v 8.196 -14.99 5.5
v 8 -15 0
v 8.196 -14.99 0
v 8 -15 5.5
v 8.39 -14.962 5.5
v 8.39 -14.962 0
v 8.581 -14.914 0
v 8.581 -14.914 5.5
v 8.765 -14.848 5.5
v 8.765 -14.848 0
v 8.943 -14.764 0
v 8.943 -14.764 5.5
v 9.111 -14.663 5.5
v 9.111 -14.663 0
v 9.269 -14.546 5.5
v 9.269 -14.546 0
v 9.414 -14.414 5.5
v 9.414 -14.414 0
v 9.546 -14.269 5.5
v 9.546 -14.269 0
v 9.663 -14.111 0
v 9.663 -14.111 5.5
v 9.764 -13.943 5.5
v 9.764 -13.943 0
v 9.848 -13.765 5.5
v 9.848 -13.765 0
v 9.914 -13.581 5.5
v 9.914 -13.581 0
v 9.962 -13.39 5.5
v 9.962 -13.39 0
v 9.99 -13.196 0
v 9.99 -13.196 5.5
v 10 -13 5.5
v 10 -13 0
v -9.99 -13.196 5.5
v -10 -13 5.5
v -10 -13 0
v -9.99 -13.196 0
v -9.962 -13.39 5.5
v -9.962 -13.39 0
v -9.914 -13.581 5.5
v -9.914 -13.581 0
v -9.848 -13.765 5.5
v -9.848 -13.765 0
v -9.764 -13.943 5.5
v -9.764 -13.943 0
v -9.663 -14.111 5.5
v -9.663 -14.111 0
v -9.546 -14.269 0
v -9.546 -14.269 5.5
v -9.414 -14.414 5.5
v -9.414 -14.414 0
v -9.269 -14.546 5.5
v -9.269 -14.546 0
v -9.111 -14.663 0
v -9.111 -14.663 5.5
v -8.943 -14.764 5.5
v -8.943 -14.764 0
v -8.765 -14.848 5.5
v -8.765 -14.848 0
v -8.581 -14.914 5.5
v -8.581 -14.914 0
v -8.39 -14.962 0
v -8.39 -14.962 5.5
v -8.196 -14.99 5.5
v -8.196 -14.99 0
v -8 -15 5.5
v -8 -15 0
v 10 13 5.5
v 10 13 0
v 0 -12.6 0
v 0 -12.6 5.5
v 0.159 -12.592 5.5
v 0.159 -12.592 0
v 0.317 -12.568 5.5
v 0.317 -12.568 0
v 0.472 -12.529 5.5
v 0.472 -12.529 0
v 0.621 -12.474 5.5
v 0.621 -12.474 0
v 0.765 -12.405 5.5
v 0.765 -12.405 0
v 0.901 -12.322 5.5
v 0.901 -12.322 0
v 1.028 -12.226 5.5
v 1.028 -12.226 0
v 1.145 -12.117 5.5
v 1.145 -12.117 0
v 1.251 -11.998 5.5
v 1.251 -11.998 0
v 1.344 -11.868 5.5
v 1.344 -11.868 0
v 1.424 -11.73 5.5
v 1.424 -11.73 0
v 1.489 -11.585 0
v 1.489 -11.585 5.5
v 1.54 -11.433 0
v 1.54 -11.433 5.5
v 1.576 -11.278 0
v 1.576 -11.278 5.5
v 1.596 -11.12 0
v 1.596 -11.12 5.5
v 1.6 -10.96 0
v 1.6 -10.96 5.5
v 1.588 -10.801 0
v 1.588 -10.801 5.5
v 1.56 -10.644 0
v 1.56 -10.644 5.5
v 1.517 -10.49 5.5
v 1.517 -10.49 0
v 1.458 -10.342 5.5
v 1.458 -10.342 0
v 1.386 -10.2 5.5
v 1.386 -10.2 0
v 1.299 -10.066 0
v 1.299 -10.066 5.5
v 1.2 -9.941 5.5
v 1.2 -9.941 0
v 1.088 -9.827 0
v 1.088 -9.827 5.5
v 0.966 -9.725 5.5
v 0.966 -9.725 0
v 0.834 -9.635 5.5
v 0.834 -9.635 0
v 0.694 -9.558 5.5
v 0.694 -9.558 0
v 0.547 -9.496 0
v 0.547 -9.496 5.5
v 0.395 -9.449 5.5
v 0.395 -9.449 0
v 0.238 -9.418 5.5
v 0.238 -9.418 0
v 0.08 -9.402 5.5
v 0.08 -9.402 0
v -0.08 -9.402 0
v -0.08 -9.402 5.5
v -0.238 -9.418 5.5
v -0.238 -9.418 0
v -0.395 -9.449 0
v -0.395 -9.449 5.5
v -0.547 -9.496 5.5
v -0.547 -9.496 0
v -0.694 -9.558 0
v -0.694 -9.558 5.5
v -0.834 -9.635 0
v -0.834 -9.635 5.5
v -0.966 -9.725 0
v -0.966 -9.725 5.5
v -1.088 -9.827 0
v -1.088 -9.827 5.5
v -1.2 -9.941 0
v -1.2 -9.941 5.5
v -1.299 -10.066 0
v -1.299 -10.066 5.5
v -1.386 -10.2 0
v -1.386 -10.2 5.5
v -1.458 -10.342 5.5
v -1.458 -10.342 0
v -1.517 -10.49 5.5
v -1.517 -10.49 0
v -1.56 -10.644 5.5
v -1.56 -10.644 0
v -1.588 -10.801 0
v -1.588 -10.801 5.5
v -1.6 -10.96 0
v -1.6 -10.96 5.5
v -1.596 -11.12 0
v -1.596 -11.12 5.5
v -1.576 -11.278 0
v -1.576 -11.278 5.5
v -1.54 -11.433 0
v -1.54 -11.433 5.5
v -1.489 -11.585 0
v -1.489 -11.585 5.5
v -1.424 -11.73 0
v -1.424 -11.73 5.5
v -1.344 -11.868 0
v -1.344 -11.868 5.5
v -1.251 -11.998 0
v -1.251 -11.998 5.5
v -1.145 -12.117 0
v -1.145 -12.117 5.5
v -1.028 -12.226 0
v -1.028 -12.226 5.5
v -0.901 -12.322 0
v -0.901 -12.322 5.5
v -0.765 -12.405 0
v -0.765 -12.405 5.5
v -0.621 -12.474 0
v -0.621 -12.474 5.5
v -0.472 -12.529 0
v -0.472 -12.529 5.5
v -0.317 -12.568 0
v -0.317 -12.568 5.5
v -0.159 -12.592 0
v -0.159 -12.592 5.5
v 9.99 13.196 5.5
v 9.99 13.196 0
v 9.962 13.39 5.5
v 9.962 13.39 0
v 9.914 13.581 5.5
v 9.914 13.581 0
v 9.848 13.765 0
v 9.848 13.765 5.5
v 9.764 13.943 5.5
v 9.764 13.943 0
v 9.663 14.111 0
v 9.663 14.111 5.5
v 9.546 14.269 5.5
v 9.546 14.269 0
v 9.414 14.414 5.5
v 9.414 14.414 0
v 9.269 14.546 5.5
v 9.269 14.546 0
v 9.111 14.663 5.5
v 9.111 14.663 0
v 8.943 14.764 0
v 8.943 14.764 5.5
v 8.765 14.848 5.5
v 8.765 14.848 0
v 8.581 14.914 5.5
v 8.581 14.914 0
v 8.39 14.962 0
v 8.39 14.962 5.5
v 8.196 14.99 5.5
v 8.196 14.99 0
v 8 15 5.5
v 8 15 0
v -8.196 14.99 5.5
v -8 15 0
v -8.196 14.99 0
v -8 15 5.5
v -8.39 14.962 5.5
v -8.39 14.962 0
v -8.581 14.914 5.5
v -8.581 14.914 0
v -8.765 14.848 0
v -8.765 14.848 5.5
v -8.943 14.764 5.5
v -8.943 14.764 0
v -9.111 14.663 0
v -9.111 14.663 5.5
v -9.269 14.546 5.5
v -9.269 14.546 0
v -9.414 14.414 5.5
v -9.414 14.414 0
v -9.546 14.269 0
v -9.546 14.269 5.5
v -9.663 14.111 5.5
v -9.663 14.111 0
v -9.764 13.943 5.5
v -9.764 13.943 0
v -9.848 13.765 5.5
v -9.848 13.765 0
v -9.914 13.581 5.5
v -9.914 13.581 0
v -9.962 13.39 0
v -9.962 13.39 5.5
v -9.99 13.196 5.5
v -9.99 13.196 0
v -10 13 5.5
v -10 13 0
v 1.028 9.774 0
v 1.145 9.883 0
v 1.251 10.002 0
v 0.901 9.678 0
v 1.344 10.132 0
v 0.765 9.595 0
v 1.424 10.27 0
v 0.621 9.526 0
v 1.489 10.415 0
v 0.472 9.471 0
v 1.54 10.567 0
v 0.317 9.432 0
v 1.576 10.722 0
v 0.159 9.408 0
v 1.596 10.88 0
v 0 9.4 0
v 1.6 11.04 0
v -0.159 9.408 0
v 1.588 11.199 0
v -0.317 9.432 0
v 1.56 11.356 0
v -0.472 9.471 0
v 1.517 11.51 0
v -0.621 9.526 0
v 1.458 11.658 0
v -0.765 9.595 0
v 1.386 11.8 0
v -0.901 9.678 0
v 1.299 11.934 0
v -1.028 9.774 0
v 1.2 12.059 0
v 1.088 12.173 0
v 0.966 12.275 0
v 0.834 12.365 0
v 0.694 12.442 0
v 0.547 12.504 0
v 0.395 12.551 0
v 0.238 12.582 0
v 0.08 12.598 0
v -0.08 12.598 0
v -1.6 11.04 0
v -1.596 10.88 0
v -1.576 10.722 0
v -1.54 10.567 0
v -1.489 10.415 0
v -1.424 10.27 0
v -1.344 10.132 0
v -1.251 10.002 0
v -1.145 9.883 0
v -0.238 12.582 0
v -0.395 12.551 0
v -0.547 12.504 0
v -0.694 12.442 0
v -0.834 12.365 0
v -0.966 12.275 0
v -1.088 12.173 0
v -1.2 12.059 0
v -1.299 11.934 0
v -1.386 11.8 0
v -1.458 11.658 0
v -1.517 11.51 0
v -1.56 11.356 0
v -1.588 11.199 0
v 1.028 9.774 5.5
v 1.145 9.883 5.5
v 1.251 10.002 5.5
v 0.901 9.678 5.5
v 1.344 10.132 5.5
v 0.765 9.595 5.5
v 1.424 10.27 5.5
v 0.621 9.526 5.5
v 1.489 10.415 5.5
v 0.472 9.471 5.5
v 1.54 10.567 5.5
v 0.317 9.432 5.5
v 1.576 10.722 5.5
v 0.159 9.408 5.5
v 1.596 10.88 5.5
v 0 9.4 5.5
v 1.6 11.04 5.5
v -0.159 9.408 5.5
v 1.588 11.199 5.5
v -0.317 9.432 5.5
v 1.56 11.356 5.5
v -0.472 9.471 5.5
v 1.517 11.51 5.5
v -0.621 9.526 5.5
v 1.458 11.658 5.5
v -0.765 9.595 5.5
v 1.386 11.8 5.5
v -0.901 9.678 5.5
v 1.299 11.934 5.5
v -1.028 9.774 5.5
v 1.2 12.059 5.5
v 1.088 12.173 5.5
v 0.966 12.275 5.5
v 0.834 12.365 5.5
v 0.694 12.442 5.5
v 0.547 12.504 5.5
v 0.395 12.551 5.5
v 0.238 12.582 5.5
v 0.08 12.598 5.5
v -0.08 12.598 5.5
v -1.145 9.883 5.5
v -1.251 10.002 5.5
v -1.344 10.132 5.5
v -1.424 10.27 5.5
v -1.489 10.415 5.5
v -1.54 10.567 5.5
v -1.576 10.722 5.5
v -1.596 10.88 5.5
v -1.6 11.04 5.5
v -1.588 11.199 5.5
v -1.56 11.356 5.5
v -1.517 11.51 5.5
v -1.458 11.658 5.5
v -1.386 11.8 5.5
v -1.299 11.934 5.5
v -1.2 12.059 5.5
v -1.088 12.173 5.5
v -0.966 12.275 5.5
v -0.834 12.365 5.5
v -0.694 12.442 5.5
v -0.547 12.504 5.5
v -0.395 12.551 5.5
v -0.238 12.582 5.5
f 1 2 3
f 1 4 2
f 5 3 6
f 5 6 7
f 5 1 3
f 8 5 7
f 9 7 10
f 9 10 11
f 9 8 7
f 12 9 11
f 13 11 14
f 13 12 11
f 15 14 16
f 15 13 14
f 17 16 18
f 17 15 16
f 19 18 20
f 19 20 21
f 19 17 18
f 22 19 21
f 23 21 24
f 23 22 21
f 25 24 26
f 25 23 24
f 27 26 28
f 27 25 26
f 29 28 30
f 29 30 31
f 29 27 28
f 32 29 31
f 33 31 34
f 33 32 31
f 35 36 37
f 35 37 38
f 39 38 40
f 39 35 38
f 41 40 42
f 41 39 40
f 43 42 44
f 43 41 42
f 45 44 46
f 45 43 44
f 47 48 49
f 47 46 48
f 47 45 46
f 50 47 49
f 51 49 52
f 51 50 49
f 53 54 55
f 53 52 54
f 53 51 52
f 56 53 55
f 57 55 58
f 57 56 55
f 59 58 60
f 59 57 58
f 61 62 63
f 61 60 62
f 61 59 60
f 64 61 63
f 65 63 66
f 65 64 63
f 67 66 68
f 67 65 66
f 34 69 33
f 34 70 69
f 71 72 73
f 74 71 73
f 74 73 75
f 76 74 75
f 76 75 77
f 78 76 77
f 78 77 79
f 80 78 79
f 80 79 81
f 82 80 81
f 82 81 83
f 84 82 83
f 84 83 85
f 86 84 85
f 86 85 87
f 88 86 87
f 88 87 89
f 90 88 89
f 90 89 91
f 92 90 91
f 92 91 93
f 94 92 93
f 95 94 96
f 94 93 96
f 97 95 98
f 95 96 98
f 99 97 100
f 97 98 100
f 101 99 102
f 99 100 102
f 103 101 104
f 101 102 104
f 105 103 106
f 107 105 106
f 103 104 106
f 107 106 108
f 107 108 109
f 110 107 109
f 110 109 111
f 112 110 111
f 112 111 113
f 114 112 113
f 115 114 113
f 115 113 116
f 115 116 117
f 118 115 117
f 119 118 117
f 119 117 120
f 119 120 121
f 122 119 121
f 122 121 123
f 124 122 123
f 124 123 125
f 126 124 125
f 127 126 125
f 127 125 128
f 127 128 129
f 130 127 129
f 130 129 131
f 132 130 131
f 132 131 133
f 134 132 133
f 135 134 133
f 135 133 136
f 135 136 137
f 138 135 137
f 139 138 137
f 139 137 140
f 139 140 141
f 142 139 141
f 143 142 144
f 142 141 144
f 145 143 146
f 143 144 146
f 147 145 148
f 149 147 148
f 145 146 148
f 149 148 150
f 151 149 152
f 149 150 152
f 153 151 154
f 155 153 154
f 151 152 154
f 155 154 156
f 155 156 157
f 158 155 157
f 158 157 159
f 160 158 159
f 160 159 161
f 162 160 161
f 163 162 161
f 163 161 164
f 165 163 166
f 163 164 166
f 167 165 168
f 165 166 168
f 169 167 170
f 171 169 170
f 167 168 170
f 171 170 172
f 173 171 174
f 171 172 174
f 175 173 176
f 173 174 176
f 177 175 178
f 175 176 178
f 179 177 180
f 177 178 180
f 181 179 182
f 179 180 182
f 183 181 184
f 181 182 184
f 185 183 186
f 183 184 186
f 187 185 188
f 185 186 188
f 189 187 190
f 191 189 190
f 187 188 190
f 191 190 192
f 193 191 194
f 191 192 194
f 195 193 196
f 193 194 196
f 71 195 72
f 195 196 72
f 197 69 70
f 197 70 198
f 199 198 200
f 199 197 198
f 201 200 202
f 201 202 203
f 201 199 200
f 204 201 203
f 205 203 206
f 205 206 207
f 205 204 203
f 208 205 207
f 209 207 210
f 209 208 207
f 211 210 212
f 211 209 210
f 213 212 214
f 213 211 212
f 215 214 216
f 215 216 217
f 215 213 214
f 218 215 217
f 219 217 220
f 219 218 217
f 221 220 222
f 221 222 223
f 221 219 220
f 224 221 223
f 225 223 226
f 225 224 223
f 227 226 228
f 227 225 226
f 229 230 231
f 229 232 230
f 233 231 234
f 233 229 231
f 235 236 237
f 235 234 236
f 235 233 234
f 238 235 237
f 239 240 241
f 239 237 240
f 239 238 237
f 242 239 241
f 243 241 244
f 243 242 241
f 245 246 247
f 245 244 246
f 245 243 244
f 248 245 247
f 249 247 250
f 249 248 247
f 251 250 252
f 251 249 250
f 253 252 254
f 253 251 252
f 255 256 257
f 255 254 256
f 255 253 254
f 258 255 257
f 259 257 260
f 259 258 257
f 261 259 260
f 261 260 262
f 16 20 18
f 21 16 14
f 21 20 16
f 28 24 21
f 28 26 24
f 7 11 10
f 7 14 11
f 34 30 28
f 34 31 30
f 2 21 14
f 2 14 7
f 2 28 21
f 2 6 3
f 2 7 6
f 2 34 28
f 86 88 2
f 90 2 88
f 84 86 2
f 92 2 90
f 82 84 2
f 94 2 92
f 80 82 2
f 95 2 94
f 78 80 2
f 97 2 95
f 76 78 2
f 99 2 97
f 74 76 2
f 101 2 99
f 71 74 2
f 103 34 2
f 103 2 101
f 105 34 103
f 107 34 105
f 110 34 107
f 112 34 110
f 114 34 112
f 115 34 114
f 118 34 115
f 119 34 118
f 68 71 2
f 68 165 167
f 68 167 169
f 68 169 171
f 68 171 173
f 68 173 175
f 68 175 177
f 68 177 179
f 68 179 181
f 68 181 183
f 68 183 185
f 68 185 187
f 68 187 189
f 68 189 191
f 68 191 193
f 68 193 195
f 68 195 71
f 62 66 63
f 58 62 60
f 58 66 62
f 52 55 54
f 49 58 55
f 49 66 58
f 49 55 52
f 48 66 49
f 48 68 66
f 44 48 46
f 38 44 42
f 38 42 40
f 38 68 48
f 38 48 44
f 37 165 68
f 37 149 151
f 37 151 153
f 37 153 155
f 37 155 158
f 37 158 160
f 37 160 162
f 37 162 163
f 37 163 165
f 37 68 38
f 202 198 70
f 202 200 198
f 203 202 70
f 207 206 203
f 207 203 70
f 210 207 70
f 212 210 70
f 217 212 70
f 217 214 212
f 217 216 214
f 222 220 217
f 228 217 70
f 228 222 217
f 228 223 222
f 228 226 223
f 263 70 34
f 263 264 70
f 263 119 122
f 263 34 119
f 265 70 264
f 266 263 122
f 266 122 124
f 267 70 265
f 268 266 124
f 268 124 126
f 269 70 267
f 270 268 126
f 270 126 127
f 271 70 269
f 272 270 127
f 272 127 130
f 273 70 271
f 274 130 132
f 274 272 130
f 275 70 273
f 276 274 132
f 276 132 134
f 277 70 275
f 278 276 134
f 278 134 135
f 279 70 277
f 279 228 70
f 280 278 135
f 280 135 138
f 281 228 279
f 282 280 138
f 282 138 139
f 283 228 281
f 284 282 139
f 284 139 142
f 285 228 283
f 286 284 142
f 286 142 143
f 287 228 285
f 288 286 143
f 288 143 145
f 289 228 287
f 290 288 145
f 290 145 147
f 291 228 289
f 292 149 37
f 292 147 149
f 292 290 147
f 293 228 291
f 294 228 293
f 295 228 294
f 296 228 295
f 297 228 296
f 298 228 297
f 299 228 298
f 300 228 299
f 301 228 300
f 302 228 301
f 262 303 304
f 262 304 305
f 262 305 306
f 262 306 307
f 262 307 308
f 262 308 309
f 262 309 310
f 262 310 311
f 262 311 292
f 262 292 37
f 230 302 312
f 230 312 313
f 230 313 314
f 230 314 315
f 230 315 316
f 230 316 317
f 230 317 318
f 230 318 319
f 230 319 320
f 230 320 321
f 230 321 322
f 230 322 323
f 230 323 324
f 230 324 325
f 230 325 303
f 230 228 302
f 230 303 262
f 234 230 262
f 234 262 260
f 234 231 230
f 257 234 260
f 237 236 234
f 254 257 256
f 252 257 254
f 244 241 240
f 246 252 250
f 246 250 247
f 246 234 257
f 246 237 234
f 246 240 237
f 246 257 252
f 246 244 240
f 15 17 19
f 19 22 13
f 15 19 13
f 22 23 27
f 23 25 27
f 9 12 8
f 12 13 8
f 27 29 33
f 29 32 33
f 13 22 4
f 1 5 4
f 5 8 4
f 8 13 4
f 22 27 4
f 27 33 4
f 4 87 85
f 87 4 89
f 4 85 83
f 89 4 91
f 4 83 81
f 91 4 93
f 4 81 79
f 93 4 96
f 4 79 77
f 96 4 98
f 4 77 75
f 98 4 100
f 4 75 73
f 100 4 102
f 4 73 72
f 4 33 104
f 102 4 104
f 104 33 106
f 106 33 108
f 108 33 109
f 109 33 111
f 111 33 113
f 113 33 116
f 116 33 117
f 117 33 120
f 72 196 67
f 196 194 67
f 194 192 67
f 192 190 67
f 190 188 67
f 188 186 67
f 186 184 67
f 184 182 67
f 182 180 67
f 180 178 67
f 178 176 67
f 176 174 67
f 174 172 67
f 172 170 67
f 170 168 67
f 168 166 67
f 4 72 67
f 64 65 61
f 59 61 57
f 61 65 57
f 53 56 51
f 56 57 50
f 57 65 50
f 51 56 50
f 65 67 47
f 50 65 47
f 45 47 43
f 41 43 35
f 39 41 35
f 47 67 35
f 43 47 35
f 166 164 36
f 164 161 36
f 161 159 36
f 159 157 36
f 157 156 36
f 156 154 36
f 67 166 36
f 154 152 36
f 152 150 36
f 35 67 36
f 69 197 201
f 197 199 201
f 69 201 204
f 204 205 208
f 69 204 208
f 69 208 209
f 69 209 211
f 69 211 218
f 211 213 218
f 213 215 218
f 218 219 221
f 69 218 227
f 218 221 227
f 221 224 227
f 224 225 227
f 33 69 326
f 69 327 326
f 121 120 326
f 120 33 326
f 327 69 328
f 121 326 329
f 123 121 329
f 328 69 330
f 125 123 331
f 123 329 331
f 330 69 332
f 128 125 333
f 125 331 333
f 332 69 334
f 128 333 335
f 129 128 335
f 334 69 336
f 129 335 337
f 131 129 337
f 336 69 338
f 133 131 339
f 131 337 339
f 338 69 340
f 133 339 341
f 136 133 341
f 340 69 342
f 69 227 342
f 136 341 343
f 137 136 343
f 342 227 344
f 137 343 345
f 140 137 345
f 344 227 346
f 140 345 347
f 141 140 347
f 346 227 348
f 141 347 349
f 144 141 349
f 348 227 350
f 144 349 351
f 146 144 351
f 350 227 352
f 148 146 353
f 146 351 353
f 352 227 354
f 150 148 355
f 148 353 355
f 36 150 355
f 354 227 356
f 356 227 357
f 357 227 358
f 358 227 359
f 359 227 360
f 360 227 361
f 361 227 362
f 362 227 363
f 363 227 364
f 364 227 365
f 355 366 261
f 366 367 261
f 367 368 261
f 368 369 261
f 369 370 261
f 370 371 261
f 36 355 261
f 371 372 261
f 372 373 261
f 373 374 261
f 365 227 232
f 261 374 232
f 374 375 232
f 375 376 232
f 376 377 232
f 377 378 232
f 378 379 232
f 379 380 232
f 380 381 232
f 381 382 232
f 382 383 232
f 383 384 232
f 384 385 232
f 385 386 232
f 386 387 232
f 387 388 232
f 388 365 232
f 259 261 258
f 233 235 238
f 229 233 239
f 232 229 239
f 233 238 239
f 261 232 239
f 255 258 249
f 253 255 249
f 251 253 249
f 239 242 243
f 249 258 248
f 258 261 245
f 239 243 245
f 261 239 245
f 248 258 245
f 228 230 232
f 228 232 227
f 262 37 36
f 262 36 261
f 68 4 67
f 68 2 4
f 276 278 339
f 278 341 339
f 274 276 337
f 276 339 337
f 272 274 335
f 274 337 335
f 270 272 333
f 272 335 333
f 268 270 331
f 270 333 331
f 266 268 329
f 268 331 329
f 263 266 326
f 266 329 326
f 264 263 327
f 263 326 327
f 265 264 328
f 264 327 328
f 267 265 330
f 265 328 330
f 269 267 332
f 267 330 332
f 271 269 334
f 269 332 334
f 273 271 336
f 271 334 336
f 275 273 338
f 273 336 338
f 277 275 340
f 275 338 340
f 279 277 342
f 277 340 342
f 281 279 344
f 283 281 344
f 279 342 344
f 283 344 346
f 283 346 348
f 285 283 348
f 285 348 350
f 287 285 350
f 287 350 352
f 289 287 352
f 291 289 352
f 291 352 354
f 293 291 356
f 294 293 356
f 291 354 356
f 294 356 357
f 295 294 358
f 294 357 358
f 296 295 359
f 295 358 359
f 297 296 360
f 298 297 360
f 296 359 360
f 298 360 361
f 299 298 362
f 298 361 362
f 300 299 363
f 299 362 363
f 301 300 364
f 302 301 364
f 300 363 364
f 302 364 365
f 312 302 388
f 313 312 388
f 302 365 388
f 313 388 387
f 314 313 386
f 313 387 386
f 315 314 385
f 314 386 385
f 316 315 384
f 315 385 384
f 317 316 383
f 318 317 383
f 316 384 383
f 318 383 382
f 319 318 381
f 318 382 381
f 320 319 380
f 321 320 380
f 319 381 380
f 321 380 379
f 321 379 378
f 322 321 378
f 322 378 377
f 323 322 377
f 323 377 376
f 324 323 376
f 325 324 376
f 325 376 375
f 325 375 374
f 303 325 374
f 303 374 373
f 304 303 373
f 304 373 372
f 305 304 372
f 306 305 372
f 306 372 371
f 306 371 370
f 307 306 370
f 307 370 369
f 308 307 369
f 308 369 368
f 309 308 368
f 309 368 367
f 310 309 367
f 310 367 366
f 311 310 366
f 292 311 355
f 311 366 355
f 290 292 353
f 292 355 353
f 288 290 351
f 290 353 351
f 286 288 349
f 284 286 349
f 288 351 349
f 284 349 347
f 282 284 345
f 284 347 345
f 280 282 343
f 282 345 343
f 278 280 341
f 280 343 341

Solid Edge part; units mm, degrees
sketch "Sketch1" plane through (0, 0, 0) normal (0, 0, 1) x (1, 0, 0)
  line L0 (10, -15) -> (-10, -15)
  line L1 (-10, -15) -> (-10, 15)
  line L2 (-10, 15) -> (10, 15)
  line L3 (10, 15) -> (10, -15)
  dimension "D1" = 30
  dimension "D2" = 20
extrude "Protrusion1" add sketch "Sketch1" along normal blind 5.5
hole "Hole_1" at (0, 11, 5.5) direction (0, 0, -1) diameter 3.2 end up to next
hole "Hole1" at (0, -11, 5.5) direction (0, 0, -1) diameter 3.2 end up to next
fillet "Round_1" radius 2 4 edges at (-10, -15, 2.75) (10, -15, 2.75) (-10, 15, 2.75) (10, 15, 2.75)
properties material "木材, アッシュ"
